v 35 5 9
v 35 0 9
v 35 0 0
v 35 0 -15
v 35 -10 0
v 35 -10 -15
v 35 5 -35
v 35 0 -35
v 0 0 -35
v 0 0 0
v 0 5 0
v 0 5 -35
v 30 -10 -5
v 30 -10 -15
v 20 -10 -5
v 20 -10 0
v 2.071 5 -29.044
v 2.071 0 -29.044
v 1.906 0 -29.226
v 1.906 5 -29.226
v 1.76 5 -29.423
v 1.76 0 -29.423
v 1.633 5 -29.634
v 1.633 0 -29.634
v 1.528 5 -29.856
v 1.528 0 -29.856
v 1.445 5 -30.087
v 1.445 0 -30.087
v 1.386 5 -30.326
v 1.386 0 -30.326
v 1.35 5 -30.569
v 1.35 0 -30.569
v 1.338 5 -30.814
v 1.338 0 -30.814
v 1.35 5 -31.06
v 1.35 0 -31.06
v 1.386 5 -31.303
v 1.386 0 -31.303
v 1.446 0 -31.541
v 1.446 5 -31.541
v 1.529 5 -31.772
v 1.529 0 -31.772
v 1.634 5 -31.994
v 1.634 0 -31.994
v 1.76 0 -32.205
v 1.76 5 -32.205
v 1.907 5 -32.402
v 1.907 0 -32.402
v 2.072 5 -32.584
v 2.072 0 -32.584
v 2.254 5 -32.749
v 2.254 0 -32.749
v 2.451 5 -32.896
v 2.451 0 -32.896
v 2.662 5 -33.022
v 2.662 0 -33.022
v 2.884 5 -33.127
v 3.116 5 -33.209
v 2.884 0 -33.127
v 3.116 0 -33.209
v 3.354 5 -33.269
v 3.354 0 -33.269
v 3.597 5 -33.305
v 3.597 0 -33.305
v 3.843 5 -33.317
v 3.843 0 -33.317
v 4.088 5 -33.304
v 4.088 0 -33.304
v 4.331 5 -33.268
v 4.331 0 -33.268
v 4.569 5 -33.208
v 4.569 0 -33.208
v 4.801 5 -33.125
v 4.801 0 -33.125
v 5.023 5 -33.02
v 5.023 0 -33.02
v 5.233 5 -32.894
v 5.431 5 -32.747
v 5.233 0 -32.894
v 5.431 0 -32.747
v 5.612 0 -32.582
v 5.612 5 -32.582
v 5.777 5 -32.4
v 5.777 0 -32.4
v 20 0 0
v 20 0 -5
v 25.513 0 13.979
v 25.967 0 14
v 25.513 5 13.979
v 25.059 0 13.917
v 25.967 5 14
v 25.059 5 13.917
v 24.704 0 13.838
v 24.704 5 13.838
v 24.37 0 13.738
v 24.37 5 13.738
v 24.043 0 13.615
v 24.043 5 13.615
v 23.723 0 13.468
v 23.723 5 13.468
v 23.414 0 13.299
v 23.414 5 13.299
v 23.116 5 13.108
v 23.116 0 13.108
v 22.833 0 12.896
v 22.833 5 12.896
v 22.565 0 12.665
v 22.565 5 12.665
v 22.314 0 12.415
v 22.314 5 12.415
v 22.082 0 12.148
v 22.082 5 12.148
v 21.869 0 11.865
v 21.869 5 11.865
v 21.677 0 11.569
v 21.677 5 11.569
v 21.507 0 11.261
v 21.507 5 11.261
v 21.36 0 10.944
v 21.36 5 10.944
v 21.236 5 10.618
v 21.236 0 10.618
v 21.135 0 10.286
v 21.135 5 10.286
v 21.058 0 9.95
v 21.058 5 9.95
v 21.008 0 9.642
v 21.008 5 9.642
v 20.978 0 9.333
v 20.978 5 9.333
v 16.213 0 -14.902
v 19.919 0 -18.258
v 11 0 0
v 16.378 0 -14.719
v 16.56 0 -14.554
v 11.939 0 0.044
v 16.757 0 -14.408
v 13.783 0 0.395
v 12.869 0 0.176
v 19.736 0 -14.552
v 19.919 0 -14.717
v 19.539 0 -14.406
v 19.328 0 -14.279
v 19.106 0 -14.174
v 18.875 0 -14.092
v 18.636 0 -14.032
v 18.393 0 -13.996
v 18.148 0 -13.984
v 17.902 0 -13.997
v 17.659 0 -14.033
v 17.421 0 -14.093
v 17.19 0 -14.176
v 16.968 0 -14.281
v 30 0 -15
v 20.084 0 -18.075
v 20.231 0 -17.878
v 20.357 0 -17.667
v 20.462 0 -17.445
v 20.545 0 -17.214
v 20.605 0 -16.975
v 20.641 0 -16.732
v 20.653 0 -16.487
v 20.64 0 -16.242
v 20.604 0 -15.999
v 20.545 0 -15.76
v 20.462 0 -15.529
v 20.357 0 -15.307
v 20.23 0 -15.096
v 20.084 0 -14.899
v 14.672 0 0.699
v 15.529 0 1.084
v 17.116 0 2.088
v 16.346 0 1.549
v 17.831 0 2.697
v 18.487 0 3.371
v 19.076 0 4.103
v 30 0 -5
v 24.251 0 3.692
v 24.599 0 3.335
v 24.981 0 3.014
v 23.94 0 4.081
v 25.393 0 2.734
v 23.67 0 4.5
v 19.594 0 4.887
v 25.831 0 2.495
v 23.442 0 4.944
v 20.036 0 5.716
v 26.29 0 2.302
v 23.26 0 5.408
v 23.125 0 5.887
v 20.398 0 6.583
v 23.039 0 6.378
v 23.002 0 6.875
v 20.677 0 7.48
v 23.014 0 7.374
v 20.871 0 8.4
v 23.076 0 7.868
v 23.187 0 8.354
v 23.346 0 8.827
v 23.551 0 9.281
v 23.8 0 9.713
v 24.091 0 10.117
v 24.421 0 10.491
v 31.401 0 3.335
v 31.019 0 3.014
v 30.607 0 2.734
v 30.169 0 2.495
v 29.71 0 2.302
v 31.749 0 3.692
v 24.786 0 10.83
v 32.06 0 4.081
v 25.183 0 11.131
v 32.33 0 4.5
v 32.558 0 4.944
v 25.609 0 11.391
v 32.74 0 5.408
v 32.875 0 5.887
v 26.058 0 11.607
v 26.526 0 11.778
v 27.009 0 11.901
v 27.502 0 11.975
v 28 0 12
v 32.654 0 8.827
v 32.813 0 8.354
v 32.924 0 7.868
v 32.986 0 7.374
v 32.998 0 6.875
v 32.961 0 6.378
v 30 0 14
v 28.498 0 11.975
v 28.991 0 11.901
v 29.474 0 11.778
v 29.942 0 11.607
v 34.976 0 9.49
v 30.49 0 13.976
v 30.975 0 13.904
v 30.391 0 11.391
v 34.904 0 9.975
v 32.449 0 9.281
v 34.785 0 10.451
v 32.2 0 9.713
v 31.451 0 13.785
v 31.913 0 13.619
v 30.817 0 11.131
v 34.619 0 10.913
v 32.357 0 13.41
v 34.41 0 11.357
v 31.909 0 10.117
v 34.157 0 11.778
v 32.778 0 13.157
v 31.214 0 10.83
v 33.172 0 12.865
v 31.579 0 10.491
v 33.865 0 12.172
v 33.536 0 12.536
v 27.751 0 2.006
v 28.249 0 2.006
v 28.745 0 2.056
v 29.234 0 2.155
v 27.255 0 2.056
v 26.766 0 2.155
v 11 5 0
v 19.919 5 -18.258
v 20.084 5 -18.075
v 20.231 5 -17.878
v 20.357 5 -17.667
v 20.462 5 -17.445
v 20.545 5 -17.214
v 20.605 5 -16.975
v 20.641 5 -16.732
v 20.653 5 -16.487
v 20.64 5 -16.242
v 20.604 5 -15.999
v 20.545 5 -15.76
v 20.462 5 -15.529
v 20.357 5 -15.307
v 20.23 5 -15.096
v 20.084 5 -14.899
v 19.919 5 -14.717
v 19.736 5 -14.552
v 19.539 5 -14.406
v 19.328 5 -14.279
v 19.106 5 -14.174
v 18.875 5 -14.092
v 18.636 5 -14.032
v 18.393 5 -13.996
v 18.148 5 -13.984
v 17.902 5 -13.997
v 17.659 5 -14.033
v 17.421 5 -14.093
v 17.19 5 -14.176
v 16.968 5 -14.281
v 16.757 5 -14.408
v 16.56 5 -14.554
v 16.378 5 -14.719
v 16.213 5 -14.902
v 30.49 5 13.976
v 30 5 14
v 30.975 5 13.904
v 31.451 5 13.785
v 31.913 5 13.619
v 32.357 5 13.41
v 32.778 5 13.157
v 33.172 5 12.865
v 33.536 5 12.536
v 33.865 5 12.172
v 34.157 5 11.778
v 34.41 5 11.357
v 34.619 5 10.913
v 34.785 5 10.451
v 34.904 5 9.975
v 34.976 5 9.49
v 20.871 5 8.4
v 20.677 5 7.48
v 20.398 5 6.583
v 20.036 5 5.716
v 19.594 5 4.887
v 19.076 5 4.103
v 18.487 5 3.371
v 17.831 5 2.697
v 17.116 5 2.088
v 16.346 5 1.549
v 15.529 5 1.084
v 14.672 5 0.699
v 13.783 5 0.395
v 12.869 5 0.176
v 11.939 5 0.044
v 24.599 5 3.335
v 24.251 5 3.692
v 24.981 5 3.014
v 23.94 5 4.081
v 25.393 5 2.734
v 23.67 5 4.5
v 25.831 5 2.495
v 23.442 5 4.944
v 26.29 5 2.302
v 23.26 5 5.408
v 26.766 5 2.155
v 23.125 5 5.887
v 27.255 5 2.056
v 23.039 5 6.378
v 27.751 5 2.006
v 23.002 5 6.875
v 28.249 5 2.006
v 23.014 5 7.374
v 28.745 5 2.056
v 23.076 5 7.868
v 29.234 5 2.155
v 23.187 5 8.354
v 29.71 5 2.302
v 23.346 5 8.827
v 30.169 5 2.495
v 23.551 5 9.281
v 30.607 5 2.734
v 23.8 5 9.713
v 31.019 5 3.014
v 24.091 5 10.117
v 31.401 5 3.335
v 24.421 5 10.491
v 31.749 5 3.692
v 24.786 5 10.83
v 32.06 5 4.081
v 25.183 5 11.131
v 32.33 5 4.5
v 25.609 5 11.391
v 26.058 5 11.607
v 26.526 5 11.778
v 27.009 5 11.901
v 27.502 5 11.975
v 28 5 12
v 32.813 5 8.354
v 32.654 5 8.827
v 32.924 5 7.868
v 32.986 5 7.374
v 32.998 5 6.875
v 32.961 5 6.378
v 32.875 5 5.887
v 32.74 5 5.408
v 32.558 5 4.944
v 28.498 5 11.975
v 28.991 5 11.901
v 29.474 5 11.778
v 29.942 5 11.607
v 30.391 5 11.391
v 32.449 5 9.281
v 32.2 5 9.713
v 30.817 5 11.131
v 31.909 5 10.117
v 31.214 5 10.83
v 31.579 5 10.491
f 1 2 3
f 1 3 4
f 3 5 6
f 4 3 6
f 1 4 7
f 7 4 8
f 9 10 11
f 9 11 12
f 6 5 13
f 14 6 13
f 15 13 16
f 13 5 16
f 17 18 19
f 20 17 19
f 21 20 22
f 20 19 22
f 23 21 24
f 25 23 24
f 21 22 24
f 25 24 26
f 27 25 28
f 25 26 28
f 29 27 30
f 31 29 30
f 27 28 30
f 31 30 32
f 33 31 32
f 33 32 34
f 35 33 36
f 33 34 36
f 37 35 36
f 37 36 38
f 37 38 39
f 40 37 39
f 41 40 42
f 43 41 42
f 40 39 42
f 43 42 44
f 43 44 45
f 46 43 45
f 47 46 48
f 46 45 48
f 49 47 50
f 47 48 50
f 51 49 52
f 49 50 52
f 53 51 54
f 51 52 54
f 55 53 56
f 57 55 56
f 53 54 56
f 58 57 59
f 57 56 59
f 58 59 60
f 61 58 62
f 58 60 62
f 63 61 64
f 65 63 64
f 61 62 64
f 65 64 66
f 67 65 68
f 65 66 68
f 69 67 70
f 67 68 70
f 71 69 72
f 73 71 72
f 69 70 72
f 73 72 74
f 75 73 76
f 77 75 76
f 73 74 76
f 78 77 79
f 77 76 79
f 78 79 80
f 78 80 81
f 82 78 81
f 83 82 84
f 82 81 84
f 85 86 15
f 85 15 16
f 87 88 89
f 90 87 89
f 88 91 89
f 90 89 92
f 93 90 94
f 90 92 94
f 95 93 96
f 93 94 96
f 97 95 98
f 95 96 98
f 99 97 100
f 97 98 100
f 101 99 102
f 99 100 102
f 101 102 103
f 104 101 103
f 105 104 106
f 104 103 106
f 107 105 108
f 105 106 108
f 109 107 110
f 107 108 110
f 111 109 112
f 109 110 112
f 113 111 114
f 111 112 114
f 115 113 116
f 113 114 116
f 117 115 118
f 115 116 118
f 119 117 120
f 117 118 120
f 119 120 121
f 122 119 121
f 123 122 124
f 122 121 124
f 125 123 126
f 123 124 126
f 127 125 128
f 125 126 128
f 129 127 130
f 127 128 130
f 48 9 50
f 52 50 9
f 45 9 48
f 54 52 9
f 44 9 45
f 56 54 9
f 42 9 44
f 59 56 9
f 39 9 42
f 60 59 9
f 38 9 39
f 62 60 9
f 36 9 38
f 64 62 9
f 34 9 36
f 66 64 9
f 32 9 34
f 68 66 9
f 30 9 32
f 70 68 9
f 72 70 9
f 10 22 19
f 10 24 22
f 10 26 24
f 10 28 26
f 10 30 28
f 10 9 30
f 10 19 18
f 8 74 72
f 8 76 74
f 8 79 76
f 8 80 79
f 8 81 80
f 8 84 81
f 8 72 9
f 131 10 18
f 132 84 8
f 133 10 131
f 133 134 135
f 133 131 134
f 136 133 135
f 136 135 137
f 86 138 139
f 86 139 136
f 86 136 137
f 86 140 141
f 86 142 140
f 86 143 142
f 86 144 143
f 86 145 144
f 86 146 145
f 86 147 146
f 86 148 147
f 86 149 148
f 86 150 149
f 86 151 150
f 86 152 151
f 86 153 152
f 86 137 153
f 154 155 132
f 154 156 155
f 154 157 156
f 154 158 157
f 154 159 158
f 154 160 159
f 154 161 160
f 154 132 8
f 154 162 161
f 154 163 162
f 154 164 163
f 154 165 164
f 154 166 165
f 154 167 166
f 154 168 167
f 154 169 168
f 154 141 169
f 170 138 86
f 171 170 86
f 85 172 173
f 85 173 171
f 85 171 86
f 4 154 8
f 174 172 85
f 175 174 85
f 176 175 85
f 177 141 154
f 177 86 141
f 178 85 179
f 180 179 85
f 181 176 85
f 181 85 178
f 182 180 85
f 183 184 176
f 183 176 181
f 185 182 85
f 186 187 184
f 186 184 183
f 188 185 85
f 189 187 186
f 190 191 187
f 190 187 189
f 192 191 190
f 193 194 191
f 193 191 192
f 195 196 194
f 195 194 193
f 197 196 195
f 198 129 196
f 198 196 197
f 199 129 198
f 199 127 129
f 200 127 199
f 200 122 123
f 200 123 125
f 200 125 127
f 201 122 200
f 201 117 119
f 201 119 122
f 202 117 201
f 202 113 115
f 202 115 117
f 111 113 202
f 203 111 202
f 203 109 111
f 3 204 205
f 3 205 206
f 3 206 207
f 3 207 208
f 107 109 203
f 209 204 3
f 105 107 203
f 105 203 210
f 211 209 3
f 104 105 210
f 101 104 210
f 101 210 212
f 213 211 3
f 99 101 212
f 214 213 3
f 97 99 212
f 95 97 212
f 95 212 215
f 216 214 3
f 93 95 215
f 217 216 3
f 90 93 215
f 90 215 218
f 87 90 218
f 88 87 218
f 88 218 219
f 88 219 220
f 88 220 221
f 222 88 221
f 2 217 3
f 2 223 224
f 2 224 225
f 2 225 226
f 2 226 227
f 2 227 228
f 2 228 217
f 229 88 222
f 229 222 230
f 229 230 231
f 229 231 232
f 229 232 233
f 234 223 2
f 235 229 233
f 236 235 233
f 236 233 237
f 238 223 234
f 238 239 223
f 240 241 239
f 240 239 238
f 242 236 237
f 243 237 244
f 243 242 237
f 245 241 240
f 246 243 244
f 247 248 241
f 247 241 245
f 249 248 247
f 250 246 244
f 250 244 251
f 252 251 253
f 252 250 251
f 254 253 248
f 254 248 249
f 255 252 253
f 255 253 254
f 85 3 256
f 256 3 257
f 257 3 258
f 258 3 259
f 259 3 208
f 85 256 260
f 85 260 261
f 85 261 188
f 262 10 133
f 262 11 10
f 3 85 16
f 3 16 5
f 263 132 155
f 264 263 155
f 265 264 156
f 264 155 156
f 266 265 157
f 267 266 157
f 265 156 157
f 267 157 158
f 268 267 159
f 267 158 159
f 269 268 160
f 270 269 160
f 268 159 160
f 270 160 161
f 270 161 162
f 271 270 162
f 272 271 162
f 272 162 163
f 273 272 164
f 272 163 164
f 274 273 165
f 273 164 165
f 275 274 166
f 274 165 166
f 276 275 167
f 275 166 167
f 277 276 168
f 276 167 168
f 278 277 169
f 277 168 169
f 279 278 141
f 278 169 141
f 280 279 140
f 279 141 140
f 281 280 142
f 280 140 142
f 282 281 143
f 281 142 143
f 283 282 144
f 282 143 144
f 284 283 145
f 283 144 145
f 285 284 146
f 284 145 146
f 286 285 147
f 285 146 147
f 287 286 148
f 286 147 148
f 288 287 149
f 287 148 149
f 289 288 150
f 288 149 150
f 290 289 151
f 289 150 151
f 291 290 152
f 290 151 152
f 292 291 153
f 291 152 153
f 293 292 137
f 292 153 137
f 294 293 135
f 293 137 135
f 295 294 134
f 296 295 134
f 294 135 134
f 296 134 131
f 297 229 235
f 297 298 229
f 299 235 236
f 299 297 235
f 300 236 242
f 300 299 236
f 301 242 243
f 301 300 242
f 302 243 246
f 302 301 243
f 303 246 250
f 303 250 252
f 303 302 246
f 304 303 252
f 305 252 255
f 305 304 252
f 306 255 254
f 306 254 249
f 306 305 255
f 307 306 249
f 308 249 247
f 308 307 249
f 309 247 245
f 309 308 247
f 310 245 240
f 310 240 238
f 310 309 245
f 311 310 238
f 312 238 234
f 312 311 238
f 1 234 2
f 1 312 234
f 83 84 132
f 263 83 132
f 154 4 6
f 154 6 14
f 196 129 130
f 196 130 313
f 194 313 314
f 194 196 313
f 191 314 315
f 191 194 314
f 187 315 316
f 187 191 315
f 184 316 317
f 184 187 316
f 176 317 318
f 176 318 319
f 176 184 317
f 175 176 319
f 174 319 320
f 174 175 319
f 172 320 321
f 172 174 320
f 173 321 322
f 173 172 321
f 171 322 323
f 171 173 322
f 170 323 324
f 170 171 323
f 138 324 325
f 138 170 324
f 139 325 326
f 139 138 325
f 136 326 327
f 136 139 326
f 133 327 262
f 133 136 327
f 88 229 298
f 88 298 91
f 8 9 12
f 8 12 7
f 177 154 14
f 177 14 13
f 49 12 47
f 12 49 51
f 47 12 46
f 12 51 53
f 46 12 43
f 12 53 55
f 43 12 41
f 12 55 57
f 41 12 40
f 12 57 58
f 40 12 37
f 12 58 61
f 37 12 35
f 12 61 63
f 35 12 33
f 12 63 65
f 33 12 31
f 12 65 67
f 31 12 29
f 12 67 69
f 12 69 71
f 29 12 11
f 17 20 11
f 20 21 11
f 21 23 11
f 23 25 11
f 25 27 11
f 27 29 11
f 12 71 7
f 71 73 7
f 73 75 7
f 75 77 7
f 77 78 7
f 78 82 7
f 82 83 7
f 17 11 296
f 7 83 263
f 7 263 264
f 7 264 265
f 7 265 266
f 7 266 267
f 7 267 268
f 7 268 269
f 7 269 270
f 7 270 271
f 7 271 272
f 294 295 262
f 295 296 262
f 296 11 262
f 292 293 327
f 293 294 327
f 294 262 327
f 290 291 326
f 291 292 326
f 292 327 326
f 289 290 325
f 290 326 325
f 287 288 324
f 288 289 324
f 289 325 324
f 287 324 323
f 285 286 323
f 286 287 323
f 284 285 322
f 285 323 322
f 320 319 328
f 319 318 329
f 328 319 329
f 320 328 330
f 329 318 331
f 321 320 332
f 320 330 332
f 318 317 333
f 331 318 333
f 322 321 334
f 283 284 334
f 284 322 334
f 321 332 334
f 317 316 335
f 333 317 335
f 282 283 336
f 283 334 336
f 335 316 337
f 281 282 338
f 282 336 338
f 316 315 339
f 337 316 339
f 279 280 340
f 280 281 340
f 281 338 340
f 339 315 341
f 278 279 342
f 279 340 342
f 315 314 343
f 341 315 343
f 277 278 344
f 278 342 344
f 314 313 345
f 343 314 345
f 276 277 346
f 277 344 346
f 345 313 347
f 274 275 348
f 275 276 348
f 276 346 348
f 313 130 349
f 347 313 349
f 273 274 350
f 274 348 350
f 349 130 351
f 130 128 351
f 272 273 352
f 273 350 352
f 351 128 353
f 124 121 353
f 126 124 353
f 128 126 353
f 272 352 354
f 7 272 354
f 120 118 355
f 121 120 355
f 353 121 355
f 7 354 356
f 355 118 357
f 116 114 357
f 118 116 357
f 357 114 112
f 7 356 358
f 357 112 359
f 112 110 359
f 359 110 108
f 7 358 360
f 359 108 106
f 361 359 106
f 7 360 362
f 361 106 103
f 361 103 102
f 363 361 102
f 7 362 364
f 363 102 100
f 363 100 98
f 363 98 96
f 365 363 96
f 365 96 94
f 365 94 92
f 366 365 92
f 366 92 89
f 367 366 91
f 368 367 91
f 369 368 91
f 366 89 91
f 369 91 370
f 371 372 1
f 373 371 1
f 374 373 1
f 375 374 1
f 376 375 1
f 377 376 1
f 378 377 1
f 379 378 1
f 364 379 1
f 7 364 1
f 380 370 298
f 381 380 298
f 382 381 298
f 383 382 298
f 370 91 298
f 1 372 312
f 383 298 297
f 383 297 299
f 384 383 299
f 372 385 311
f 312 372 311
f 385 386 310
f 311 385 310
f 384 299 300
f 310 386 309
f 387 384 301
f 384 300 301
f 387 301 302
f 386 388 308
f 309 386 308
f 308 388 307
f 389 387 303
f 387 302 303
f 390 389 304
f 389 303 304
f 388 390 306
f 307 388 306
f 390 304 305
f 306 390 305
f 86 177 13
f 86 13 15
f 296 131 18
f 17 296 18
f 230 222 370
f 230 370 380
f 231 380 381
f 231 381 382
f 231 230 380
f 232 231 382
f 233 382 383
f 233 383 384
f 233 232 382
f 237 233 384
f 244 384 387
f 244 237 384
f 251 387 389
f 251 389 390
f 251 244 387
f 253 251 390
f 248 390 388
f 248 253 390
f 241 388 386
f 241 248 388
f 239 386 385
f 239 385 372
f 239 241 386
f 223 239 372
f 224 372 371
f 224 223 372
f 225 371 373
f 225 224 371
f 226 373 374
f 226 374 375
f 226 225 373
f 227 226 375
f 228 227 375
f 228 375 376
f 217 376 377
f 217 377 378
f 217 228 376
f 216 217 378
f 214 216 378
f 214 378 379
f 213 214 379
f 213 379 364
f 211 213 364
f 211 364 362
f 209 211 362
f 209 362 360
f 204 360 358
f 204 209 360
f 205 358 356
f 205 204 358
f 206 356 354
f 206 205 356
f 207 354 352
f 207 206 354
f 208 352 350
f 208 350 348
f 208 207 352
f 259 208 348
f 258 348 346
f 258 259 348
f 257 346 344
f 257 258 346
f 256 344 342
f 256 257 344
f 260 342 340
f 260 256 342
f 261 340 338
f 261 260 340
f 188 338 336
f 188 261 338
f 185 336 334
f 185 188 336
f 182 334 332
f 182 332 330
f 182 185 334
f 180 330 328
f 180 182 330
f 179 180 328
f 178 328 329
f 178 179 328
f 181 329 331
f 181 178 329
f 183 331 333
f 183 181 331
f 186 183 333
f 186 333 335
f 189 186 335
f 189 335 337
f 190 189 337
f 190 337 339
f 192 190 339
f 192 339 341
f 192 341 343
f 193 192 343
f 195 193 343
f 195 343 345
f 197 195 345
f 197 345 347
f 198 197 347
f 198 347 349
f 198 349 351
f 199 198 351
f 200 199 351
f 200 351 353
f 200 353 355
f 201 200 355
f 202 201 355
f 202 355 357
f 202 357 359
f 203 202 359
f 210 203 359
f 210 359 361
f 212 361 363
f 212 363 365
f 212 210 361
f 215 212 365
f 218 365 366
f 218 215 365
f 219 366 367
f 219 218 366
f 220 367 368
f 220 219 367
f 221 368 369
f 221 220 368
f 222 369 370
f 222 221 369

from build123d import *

# Parameters (mm, degrees)
SKETCH1_R           = 5
BOSS_EXTRUDE1_DEPTH = 5
BOSS_EXTRUDE2_DEPTH = 10
FILLET1_R           = 10
FILLET4_R           = 5


with BuildPart() as part:
    # Sketch1 → Boss-Extrude1 (new body)
    with BuildSketch(Plane(origin=(0, 0, 0), x_dir=(1, 0, 0), z_dir=(0, 1, 0))):
        Polygon((0, 0), (0, 35), (35, 35), (35, 0), (35, -14), (21, -14), (21, 0), align=None)
        with Locations(Location((28, -7, 0), (0, 0, 270))):
            Circle(SKETCH1_R, mode=Mode.SUBTRACT)
        with BuildLine():
            Line((5.77728435, 32.399644503), (19.919419974, 18.257508879))
            ThreePointArc((19.919419974, 18.257508879), (19.829534471, 14.632089471), (16.21302376, 14.901525103))
            Line((16.21302376, 14.901525103), (2.070888136, 29.043660727))
            ThreePointArc((2.070888136, 29.043660727), (2.160773638, 32.669080135), (5.77728435, 32.399644503))
        make_face(mode=Mode.SUBTRACT)
    extrude(amount=BOSS_EXTRUDE1_DEPTH)

    # Sketch2 → Boss-Extrude2 (add)
    with BuildSketch(Plane.XZ):
        Polygon((30, -5), (20, -5), (20, 0), (35, 0), (35, -15), (30, -15), align=None)
    extrude(amount=BOSS_EXTRUDE2_DEPTH)

    # Fillet1
    # the kernel refuses this fillet: 10 mm, written as the material it adds along each edge
    with BuildSketch(Plane(origin=(21, 0, 0), x_dir=(-1, 0, 0), z_dir=(0, 1, 0))) as fillet1_piece_1:
        with BuildLine():
            CenterArc((FILLET1_R, FILLET1_R), FILLET1_R, 180, 90)
            Line((0, FILLET1_R), (0, 0))
            Line((0, 0), (FILLET1_R, 0))
        make_face()
    extrude(amount=5)

    # Fillet4
    fillet4_edges = [part.edges().sort_by_distance(p)[0] for p in [
        (35, 2.5, 14),
        (21, 2.5, 14),
    ]]
    fillet(fillet4_edges, radius=FILLET4_R)


solid = part.part
